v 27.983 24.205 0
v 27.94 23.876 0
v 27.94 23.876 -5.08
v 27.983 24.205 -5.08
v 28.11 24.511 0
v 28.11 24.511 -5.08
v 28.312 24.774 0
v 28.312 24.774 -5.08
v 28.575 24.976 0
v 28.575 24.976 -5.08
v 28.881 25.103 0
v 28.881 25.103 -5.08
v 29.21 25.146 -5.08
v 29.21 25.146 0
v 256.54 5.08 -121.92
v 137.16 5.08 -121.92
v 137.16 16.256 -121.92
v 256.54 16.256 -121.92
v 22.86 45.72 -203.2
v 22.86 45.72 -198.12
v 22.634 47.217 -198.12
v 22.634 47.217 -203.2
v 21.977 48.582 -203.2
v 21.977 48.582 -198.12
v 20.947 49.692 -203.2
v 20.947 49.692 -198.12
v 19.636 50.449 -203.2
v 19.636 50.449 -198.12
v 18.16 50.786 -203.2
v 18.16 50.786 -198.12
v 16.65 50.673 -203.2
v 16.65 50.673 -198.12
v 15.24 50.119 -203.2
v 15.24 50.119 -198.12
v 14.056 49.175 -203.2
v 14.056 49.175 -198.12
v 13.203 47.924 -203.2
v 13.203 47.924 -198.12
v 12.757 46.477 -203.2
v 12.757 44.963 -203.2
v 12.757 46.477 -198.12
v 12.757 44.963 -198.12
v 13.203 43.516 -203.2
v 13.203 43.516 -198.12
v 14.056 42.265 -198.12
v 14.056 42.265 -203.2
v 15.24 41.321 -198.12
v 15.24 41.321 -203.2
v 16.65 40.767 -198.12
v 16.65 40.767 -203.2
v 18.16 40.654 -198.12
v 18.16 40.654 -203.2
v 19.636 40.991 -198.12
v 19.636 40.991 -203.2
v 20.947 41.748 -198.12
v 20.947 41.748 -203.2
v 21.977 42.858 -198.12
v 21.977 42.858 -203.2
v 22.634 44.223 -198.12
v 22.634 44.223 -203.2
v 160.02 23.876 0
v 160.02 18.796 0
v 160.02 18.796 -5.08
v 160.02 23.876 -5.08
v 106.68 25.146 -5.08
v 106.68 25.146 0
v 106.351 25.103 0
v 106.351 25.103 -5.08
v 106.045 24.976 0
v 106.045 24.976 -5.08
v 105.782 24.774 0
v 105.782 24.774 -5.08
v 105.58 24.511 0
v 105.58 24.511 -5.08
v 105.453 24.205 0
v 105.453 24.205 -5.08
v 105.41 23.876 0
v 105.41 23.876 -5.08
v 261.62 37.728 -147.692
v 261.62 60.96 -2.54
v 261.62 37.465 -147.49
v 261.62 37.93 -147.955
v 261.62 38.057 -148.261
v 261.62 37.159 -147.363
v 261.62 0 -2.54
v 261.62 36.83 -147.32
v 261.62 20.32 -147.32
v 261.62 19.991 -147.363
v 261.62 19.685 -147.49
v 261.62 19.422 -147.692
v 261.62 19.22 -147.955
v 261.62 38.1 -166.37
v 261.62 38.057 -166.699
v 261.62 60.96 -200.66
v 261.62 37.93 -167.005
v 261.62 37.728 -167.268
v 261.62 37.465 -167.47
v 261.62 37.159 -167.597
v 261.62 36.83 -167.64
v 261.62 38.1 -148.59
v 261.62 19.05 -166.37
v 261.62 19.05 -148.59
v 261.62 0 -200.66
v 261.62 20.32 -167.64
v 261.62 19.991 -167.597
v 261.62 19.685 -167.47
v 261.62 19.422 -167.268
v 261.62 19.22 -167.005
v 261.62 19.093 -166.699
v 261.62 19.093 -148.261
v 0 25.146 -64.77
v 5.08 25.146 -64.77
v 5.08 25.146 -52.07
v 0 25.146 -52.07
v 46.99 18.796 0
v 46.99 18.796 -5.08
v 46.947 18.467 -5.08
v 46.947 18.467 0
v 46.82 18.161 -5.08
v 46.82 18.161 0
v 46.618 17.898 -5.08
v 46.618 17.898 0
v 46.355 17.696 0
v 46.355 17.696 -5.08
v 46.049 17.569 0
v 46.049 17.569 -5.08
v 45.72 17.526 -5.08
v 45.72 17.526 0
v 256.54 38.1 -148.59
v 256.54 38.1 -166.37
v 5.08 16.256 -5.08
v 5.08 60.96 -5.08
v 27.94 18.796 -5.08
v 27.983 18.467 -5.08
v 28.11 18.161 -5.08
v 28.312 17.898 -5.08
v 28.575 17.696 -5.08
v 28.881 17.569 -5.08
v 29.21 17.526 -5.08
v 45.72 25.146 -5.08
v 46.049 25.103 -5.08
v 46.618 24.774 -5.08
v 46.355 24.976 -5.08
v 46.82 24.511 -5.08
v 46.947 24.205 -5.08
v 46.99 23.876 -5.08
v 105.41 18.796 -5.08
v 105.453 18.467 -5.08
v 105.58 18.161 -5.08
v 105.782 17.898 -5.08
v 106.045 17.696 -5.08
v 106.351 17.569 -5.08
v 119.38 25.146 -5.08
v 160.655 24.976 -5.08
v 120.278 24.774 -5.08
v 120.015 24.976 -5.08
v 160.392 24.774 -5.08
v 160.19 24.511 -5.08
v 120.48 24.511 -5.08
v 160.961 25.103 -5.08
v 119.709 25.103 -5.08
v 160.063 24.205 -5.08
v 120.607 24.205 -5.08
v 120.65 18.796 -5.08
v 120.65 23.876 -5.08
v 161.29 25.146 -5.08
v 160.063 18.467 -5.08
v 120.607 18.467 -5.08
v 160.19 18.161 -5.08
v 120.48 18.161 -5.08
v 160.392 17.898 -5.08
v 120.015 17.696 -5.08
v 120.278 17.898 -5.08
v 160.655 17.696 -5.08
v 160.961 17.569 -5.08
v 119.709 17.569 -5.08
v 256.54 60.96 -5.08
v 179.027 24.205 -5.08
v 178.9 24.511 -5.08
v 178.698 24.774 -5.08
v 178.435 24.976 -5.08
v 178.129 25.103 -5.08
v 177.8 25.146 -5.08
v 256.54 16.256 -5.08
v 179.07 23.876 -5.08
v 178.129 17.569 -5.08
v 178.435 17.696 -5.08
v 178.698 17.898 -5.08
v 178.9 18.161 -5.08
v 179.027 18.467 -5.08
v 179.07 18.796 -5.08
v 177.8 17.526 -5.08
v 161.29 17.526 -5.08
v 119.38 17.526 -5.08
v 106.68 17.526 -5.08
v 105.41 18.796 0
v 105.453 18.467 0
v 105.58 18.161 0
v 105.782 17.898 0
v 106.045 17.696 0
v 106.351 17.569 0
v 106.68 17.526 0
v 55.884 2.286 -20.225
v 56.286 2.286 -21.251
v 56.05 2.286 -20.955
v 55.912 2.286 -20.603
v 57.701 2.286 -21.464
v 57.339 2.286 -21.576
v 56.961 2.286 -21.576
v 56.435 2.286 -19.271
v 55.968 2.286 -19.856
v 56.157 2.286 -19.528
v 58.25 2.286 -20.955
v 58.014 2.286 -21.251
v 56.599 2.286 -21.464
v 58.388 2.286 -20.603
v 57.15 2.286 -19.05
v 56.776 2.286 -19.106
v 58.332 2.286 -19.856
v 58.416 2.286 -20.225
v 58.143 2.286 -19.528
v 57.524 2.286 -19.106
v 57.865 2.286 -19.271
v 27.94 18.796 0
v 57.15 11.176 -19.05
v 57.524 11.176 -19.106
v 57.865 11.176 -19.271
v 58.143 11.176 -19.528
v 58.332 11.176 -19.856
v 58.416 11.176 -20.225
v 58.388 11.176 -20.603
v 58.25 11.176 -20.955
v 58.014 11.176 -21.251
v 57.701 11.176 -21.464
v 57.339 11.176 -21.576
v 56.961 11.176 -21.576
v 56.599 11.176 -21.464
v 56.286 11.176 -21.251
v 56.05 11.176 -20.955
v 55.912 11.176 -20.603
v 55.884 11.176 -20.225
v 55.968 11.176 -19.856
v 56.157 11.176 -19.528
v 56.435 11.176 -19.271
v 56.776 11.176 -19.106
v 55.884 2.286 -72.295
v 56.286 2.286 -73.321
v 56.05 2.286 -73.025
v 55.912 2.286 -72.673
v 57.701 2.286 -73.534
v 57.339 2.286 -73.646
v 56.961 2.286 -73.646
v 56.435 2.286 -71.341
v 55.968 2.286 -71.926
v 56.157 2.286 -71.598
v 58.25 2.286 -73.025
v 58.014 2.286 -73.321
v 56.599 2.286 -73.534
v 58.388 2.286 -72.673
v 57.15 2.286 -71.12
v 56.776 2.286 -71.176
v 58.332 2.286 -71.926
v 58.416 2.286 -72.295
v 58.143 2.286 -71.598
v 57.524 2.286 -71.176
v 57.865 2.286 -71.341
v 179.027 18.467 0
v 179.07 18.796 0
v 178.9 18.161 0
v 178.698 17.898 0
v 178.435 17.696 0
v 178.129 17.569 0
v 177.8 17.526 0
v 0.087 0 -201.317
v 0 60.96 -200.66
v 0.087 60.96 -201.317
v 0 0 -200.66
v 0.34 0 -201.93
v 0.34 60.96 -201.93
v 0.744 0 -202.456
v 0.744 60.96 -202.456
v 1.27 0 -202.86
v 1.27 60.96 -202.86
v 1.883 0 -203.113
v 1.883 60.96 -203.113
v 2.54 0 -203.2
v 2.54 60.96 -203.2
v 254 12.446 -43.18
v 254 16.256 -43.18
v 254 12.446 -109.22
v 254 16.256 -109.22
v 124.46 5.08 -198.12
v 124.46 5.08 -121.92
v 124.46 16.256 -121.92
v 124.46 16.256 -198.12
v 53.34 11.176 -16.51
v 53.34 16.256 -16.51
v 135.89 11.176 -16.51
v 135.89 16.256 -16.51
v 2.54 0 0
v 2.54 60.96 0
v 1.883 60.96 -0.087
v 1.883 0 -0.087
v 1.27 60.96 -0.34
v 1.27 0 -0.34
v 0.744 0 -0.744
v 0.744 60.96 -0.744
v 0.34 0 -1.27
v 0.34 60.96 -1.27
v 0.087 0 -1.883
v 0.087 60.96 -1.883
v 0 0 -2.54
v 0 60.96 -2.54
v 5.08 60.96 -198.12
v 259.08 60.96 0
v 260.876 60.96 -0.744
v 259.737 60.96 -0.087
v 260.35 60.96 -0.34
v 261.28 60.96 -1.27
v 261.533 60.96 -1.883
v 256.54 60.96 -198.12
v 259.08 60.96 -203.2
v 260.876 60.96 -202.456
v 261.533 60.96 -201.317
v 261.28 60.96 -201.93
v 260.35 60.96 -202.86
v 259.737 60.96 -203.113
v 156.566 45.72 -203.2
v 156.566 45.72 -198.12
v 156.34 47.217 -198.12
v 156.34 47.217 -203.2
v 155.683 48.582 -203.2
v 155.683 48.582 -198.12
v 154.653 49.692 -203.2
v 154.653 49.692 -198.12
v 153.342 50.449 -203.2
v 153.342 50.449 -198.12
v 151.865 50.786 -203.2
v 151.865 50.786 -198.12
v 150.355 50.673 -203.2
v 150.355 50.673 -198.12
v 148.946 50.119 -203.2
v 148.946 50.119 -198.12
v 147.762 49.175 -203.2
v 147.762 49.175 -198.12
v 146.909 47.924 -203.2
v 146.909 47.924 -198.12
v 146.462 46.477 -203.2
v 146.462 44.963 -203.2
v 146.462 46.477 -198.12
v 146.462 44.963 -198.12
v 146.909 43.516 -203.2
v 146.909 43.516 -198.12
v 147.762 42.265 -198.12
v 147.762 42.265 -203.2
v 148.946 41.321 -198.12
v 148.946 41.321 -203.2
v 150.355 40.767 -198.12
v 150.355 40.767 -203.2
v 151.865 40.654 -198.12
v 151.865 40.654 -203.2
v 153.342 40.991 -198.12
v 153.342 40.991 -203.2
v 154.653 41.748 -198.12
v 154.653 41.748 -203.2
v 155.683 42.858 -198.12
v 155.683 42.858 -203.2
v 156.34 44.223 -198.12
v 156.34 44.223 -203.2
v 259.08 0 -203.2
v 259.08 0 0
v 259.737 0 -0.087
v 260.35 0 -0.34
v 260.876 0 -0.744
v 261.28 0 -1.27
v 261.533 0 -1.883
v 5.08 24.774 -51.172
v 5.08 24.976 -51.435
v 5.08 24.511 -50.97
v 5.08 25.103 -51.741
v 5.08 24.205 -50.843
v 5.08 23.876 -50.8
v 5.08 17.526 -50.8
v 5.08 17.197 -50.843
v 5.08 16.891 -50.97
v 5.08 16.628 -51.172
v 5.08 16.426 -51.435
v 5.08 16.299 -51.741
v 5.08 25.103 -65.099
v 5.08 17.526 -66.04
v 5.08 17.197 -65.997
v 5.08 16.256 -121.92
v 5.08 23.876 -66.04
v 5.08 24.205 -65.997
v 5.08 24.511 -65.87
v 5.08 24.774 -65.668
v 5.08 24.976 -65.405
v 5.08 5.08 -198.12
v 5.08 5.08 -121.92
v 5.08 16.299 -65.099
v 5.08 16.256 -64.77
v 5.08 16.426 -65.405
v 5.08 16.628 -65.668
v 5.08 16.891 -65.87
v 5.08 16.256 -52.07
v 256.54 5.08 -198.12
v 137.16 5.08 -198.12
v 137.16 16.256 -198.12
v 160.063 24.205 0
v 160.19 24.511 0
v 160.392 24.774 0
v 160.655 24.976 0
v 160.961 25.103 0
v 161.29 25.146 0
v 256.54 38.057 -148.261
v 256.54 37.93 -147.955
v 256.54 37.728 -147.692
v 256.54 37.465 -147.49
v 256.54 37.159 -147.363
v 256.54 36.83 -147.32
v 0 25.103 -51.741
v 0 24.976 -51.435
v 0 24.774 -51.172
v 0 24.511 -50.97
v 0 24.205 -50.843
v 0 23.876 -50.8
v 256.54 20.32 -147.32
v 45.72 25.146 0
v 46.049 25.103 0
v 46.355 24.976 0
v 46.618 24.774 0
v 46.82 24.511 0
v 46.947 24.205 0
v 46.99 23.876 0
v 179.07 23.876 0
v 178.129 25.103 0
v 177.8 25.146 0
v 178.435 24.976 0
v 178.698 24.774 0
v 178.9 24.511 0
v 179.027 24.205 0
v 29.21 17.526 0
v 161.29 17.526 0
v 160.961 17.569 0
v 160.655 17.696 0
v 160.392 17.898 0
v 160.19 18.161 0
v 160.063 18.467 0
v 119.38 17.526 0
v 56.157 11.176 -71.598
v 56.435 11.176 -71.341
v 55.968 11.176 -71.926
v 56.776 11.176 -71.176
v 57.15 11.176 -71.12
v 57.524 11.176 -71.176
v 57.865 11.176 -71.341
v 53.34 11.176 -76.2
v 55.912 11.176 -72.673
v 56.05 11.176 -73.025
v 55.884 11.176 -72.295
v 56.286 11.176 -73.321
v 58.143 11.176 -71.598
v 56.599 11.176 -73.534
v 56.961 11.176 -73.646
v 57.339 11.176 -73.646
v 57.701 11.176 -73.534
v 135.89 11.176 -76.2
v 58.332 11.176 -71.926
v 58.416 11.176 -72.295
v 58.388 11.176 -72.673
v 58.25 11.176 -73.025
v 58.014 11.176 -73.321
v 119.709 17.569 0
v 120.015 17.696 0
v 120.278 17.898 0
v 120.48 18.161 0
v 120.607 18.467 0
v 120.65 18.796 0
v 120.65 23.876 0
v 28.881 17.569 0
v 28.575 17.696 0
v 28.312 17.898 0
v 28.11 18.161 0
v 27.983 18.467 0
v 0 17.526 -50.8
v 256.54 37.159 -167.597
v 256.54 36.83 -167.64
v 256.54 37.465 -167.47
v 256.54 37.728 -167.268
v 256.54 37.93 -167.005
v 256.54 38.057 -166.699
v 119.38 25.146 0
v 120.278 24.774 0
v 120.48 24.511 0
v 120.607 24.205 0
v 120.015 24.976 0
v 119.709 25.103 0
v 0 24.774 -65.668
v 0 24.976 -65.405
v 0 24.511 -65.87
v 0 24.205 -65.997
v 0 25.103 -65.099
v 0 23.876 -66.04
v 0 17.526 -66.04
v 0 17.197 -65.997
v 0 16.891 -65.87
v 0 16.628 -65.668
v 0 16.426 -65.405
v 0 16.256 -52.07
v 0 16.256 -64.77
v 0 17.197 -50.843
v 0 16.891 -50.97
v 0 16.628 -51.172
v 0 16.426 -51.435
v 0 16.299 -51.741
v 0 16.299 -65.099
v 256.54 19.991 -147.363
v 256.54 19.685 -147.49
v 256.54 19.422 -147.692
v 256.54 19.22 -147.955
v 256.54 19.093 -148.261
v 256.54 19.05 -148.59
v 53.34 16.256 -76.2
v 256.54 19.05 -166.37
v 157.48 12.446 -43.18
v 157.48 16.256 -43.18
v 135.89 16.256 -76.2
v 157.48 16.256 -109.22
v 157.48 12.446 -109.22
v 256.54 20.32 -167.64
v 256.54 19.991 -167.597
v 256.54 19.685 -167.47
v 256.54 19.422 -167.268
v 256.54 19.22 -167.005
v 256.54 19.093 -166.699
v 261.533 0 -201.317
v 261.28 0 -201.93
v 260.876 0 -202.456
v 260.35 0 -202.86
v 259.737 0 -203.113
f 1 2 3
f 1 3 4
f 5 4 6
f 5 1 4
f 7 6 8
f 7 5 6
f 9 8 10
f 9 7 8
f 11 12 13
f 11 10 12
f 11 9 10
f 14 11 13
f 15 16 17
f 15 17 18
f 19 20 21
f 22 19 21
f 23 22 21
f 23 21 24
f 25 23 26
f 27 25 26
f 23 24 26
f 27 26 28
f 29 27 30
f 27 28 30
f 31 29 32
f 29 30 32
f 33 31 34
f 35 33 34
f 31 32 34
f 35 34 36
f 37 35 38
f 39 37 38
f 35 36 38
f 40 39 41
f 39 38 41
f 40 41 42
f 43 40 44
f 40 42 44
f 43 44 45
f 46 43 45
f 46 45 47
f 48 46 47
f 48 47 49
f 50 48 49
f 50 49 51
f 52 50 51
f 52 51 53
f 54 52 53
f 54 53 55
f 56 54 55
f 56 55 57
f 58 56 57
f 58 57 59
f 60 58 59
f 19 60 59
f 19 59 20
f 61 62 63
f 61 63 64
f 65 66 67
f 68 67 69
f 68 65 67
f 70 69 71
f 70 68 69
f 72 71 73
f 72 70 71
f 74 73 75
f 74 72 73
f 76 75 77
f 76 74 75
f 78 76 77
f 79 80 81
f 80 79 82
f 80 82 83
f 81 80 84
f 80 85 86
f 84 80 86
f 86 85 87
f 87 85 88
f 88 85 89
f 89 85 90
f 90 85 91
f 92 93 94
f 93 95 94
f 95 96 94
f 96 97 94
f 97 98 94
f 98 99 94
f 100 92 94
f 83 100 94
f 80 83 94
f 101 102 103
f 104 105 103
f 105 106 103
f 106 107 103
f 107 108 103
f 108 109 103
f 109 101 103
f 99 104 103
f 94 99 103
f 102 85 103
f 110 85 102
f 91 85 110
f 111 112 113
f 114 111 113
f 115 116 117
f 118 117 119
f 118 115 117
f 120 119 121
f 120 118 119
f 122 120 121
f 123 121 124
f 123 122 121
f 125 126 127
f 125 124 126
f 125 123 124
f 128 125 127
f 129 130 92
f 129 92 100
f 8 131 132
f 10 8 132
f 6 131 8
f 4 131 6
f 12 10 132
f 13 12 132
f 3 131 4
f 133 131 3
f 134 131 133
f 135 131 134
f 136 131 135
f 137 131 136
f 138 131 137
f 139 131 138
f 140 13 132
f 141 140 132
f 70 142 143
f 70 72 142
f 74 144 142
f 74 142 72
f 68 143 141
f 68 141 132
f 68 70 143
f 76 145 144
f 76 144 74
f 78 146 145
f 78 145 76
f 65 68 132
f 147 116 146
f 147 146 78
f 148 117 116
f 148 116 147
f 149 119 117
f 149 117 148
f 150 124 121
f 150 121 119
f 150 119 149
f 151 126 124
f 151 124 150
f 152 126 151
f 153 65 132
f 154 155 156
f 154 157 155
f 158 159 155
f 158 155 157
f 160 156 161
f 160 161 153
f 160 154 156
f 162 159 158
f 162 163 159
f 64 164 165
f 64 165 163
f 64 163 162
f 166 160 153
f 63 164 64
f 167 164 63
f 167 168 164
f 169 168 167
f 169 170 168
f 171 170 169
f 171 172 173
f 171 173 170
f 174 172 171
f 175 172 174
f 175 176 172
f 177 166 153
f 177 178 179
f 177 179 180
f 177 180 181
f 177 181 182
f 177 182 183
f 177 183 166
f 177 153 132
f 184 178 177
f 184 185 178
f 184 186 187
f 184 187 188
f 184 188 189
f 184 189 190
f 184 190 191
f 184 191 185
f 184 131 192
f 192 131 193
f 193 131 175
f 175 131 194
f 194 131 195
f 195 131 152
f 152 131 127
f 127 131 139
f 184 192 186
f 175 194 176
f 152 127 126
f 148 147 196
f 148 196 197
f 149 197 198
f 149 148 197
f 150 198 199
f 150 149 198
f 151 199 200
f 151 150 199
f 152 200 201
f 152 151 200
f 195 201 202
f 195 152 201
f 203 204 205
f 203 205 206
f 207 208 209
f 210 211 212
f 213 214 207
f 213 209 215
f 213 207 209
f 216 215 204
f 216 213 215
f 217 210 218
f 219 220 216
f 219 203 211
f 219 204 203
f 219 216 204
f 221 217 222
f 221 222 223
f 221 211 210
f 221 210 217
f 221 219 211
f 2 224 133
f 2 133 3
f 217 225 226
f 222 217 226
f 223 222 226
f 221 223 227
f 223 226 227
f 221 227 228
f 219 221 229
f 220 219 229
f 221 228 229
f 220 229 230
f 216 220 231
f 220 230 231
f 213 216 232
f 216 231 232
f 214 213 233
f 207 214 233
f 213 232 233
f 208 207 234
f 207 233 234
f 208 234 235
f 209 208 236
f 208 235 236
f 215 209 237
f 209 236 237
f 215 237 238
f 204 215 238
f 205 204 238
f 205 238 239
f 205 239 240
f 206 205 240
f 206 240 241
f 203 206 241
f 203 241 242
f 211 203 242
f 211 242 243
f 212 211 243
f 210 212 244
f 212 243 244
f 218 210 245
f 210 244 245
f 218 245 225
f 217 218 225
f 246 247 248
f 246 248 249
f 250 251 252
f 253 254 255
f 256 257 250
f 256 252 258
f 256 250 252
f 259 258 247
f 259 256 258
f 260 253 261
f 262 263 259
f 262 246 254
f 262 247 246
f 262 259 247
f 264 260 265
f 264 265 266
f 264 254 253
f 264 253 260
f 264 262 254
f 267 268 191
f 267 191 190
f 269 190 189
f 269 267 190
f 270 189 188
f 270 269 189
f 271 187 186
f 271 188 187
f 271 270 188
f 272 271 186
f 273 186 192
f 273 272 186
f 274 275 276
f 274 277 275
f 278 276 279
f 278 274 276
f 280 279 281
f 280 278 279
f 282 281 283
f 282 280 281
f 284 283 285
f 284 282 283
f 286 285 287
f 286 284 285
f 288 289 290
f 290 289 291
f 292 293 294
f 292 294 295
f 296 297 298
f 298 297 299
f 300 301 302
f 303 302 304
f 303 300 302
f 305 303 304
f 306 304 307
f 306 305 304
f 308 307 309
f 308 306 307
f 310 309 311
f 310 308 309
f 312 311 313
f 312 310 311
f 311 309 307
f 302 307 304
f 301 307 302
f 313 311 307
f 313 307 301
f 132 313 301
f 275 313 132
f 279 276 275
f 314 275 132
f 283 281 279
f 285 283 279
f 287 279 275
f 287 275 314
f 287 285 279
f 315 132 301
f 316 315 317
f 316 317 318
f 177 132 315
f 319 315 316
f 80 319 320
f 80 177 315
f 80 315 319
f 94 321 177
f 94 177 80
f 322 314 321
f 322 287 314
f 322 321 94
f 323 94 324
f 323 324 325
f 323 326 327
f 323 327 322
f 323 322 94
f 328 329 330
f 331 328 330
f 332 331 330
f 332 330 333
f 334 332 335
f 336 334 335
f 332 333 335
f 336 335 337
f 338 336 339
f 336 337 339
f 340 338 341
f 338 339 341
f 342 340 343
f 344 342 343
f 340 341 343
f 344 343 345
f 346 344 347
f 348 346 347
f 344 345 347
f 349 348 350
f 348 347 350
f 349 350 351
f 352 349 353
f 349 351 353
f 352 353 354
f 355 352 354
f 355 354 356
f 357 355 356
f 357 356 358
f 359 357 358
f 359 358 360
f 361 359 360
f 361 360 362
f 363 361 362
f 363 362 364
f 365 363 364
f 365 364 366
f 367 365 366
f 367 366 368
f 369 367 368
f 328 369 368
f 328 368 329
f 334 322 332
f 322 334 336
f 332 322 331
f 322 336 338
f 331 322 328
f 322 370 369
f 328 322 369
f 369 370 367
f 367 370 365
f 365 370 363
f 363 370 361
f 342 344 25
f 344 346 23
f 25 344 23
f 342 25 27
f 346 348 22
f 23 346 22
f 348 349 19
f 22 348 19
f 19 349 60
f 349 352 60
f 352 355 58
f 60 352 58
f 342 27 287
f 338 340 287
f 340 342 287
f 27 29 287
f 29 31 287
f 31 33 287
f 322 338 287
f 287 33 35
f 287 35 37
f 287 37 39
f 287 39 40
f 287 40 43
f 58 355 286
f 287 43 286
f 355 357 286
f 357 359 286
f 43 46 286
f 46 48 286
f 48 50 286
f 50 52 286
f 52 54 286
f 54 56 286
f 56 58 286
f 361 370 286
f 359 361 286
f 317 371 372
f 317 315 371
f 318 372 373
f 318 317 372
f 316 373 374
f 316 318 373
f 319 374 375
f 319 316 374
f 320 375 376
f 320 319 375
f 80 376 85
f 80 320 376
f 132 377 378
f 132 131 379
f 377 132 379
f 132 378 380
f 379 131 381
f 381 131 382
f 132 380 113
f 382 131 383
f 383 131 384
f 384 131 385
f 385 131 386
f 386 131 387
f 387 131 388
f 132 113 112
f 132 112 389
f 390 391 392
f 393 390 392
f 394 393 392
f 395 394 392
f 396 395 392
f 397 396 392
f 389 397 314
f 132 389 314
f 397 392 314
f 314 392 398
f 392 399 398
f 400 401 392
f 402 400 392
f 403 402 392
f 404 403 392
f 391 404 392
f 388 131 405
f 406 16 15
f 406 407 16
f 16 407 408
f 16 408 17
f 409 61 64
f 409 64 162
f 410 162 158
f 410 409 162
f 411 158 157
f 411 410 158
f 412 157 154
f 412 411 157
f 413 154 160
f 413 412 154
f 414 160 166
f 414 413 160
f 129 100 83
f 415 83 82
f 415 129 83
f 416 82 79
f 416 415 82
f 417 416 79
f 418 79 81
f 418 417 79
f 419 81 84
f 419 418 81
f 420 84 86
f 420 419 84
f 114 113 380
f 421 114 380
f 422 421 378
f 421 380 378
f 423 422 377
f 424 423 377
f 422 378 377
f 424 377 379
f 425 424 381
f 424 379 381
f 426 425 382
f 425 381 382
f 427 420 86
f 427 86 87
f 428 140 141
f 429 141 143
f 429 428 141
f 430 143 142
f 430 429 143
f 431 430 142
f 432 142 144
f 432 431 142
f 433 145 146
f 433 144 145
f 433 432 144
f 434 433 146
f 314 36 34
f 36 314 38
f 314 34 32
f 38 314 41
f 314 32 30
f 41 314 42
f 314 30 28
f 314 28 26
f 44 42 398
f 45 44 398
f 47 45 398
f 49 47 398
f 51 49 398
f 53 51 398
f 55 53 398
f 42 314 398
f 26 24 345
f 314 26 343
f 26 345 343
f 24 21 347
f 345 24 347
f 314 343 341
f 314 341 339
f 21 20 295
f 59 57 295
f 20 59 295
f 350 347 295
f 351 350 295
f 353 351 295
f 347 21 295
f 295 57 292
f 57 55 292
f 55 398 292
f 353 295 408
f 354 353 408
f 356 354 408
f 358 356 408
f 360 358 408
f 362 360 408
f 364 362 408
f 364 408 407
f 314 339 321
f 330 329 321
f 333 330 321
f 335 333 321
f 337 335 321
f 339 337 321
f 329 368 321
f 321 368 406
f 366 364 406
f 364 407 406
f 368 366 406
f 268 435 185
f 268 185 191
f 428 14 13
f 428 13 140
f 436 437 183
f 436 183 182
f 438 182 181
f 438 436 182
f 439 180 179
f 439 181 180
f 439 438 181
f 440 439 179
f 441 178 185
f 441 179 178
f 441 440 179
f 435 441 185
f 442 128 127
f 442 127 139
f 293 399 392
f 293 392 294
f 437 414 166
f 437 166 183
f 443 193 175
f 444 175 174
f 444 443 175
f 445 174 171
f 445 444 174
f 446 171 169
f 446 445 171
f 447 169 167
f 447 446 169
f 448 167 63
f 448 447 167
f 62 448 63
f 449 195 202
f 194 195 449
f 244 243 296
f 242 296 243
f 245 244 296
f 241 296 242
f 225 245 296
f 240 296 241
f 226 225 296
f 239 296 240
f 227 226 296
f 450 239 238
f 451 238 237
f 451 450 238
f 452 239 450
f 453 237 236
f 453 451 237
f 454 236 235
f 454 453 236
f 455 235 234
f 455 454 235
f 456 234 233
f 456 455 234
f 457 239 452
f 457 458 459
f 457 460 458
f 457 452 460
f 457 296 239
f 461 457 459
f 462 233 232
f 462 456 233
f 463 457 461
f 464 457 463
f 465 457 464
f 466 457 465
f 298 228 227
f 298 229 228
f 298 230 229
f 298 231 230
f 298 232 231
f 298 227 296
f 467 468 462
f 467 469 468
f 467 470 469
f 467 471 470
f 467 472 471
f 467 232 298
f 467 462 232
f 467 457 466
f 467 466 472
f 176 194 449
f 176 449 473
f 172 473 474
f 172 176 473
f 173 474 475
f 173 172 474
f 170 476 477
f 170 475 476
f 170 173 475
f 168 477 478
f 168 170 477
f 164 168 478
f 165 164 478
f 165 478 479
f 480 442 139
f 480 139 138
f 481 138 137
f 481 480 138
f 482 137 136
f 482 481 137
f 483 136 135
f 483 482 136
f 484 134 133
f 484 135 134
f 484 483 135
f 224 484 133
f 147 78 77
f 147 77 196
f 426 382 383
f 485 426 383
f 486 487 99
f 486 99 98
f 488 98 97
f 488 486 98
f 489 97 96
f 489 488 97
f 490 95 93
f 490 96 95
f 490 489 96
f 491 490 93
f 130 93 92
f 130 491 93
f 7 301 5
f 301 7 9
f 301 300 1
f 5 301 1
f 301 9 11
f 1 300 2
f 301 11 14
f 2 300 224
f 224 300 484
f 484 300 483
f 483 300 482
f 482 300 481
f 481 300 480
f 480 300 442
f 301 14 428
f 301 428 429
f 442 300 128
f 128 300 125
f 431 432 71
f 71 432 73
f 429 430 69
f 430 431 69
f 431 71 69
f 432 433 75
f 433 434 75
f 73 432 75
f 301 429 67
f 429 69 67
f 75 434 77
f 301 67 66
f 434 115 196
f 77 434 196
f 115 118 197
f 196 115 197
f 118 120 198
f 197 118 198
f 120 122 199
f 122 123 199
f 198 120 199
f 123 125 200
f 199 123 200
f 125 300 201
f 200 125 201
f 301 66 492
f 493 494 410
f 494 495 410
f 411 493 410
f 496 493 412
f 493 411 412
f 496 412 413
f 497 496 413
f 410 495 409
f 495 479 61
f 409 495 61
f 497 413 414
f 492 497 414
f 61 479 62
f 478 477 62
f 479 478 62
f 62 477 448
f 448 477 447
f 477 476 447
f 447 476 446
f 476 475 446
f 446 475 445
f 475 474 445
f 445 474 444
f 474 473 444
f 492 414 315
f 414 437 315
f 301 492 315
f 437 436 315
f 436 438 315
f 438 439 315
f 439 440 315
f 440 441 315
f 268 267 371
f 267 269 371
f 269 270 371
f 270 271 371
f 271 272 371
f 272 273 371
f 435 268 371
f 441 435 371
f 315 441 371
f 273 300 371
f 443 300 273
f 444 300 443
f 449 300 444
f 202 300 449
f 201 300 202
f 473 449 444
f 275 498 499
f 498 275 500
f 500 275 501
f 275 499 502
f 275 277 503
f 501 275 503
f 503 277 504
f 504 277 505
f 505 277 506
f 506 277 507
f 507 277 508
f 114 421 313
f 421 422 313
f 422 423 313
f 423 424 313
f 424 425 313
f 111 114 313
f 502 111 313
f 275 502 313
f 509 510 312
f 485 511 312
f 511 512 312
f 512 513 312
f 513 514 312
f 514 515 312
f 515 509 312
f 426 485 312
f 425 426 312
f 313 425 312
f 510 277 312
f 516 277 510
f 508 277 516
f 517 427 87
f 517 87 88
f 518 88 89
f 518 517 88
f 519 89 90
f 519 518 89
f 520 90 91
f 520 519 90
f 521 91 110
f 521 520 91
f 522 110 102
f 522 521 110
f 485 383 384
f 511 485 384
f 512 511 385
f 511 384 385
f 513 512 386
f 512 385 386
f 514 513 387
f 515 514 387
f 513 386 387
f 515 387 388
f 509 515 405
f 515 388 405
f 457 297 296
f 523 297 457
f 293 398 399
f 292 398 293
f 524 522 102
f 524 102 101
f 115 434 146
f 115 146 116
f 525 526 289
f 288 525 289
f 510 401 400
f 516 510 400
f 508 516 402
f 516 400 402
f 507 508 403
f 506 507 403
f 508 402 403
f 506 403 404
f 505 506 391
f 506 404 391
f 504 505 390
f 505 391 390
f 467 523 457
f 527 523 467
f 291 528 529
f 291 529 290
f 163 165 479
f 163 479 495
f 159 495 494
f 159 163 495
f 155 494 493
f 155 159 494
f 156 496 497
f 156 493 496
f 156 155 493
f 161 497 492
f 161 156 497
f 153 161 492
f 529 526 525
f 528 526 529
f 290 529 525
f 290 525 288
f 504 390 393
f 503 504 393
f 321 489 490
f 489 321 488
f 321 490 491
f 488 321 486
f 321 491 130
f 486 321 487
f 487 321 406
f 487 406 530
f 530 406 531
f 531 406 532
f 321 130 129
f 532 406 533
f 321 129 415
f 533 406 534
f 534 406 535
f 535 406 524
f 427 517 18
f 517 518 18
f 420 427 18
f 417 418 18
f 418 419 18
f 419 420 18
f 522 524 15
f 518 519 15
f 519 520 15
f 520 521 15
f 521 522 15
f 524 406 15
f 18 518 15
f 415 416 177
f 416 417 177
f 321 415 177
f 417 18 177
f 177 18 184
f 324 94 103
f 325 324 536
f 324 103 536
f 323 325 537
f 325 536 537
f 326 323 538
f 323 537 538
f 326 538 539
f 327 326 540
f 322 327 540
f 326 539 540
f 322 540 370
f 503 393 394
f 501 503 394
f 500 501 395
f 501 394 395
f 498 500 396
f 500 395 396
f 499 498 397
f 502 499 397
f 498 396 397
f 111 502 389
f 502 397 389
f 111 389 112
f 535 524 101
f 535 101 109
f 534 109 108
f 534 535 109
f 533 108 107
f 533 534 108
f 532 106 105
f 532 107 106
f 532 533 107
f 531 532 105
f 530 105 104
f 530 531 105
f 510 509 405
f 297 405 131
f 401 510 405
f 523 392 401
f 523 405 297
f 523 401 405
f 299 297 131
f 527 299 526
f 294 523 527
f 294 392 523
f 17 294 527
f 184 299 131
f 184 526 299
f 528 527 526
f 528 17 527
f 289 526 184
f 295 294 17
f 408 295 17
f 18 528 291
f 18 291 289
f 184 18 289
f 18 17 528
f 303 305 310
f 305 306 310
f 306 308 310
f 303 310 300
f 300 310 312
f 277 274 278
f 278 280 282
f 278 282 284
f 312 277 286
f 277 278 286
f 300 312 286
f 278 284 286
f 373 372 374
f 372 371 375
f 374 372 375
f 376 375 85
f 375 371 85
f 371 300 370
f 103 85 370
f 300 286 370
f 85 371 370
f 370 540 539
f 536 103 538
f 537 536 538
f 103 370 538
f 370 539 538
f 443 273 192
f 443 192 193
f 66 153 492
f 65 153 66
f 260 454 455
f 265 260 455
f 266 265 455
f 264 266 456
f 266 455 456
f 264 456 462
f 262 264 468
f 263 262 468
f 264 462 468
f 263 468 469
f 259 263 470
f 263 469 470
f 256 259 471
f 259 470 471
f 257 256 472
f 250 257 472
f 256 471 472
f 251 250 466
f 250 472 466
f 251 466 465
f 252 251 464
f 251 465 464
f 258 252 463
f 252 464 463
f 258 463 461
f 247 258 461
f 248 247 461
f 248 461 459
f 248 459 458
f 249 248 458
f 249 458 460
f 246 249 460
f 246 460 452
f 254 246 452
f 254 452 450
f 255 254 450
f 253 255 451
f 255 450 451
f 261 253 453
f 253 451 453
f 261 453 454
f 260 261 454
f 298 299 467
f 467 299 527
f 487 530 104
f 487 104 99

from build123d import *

# Parameters (mm, degrees)
SKETCH1_W           = 261.62
SKETCH1_H           = 203.2
BOSS_EXTRUDE1_DEPTH = 5.08
BOSS_EXTRUDE3_DEPTH = 55.88
BOSS_EXTRUDE4_DEPTH = 11.176
SKETCH7_W           = 251.46
SKETCH7_H           = 116.84
BOSS_EXTRUDE5_DEPTH = 11.176
SKETCH8_R           = 5.08
CUT_EXTRUDE2_DEPTH  = 11.176
CUT_EXTRUDE3_DEPTH  = 11.176
SKETCH10_W          = 82.55
SKETCH10_H          = 59.69
CUT_EXTRUDE4_DEPTH  = 5.08
SKETCH12_R          = 1.27
CUT_EXTRUDE5_DEPTH  = 8.89
SKETCH13_W          = 96.52
SKETCH13_H          = 66.04
CUT_EXTRUDE6_DEPTH  = 3.81
SKETCH14_W          = 251.46
SKETCH14_H          = 5.08
BOSS_EXTRUDE6_DEPTH = 44.704
CUT_EXTRUDE7_DEPTH  = 39.624
CUT_EXTRUDE8_DEPTH  = 39.624
CUT_EXTRUDE9_DEPTH  = 39.624
FILLET1_R           = 2.54


with BuildPart() as part:
    # Sketch1 → Boss-Extrude1 (new body)
    with BuildSketch(Plane(origin=(0, 0, 0), x_dir=(1, 0, 0), z_dir=(0, 1, 0))):
        with Locations((130.81, 101.6)):
            Rectangle(SKETCH1_W, SKETCH1_H)
    extrude(amount=BOSS_EXTRUDE1_DEPTH)

    # Sketch4 → Boss-Extrude3 (add)
    with BuildSketch(Plane(origin=(0, 5.08, 0), x_dir=(1, 0, 0), z_dir=(0, 1, 0))):
        Polygon((0, 0), (5.08, 0), (5.08, 198.12), (256.54, 198.12), (256.54, 0), (261.62, 0), (261.62, 203.2), (0, 203.2), align=None)
    extrude(amount=BOSS_EXTRUDE3_DEPTH)

    # Sketch5 → Boss-Extrude4 (add)
    with BuildSketch(Plane(origin=(0, 5.08, 0), x_dir=(1, 0, 0), z_dir=(0, 1, 0))):
        Polygon((5.08, 121.92), (124.46, 121.92), (124.46, 198.12), (137.16, 198.12), (137.16, 121.92), (256.54, 121.92), (256.54, 116.84), (5.08, 116.84), align=None)
    extrude(amount=BOSS_EXTRUDE4_DEPTH)

    # Sketch7 → Boss-Extrude5 (add)
    with BuildSketch(Plane(origin=(0, 5.08, 0), x_dir=(1, 0, 0), z_dir=(0, 1, 0))):
        with Locations((130.81, 58.42)):
            Rectangle(SKETCH7_W, SKETCH7_H)
    extrude(amount=BOSS_EXTRUDE5_DEPTH)

    # Sketch8 → Cut-Extrude2 (cut)
    with BuildSketch(Plane.XY.offset(-198.12)):
        with Locations((17.78, 45.72)):
            Circle(SKETCH8_R)
        with Locations((151.4856, 45.72)):
            Circle(SKETCH8_R)
    extrude(amount=-CUT_EXTRUDE2_DEPTH, mode=Mode.SUBTRACT)

    # Sketch9 → Cut-Extrude3 (cut)
    with BuildSketch(Plane(origin=(5.08, 0, 0), x_dir=(0, 0, -1), z_dir=(1, 0, 0))):
        with BuildLine():
            Line((52.07, 16.256), (64.77, 16.256))
            ThreePointArc((64.77, 16.256), (65.668025612, 16.627974388), (66.04, 17.526))
            Line((66.04, 17.526), (66.04, 23.876))
            ThreePointArc((66.04, 23.876), (65.668025612, 24.774025612), (64.77, 25.146))
            Line((64.77, 25.146), (52.07, 25.146))
            ThreePointArc((52.07, 25.146), (51.171974388, 24.774025612), (50.8, 23.876))
            Line((50.8, 23.876), (50.8, 17.526))
            ThreePointArc((50.8, 17.526), (51.171974388, 16.627974388), (52.07, 16.256))
        make_face()
    extrude(amount=-CUT_EXTRUDE3_DEPTH, mode=Mode.SUBTRACT)

    # Sketch10 → Cut-Extrude4 (cut)
    with BuildSketch(Plane(origin=(0, 16.256, 0), x_dir=(1, 0, 0), z_dir=(0, 1, 0))):
        with Locations((94.615, 46.355)):
            Rectangle(SKETCH10_W, SKETCH10_H)
    extrude(amount=-CUT_EXTRUDE4_DEPTH, mode=Mode.SUBTRACT)

    # Sketch12 → Cut-Extrude5 (cut)
    with BuildSketch(Plane(origin=(0, 11.176, 0), x_dir=(1, 0, 0), z_dir=(0, 1, 0))):
        with Locations(Location((57.15, 72.39, 0), (0, 0, 270))):
            Circle(SKETCH12_R)
        with Locations(Location((57.15, 20.32, 0), (0, 0, 270))):
            Circle(SKETCH12_R)
    extrude(amount=-CUT_EXTRUDE5_DEPTH, mode=Mode.SUBTRACT)

    # Sketch13 → Cut-Extrude6 (cut)
    with BuildSketch(Plane(origin=(0, 16.256, 0), x_dir=(1, 0, 0), z_dir=(0, 1, 0))):
        with Locations((205.74, 76.2)):
            Rectangle(SKETCH13_W, SKETCH13_H)
    extrude(amount=-CUT_EXTRUDE6_DEPTH, mode=Mode.SUBTRACT)

    # Sketch14 → Boss-Extrude6 (add)
    with BuildSketch(Plane(origin=(0, 16.256, 0), x_dir=(1, 0, 0), z_dir=(0, 1, 0))):
        with Locations((130.81, 2.54)):
            Rectangle(SKETCH14_W, SKETCH14_H)
    extrude(amount=BOSS_EXTRUDE6_DEPTH)

    # Sketch15 → Cut-Extrude7 (cut)
    with BuildSketch(Plane(origin=(0, 0, -5.08), x_dir=(-1, 0, 0), z_dir=(0, 0, -1))):
        with BuildLine():
            Line((-106.68, 17.526), (-119.38, 17.526))
            ThreePointArc((-119.38, 17.526), (-120.278025612, 17.897974388), (-120.65, 18.796))
            Line((-120.65, 18.796), (-120.65, 23.876))
            ThreePointArc((-120.65, 23.876), (-120.278025612, 24.774025612), (-119.38, 25.146))
            Line((-119.38, 25.146), (-106.68, 25.146))
            ThreePointArc((-106.68, 25.146), (-105.781974388, 24.774025612), (-105.41, 23.876))
            Line((-105.41, 23.876), (-105.41, 18.796))
            ThreePointArc((-105.41, 18.796), (-105.781974388, 17.897974388), (-106.68, 17.526))
        make_face()
    extrude(amount=-CUT_EXTRUDE7_DEPTH, mode=Mode.SUBTRACT)

    # Sketch16 → Cut-Extrude8 (cut)
    with BuildSketch(Plane.XY):
        with BuildLine():
            Line((161.29, 25.146), (177.8, 25.146))
            ThreePointArc((177.8, 25.146), (178.698025612, 24.774025612), (179.07, 23.876))
            Line((179.07, 23.876), (179.07, 18.796))
            ThreePointArc((179.07, 18.796), (178.698025612, 17.897974388), (177.8, 17.526))
            Line((177.8, 17.526), (161.29, 17.526))
            ThreePointArc((161.29, 17.526), (160.391974388, 17.897974388), (160.02, 18.796))
            Line((160.02, 18.796), (160.02, 23.876))
            ThreePointArc((160.02, 23.876), (160.391974388, 24.774025612), (161.29, 25.146))
        make_face()
        with BuildLine():
            Line((29.21, 25.146), (45.72, 25.146))
            ThreePointArc((45.72, 25.146), (46.618025612, 24.774025612), (46.99, 23.876))
            Line((46.99, 23.876), (46.99, 18.796))
            ThreePointArc((46.99, 18.796), (46.618025612, 17.897974388), (45.72, 17.526))
            Line((45.72, 17.526), (29.21, 17.526))
            ThreePointArc((29.21, 17.526), (28.311974388, 17.897974388), (27.94, 18.796))
            Line((27.94, 18.796), (27.94, 23.876))
            ThreePointArc((27.94, 23.876), (28.311974388, 24.774025612), (29.21, 25.146))
        make_face()
    extrude(amount=-CUT_EXTRUDE8_DEPTH, mode=Mode.SUBTRACT)

    # Sketch17 → Cut-Extrude9 (cut)
    with BuildSketch(Plane.ZY.offset(-256.54)):
        with BuildLine():
            Line((-166.37, 38.1), (-148.59, 38.1))
            ThreePointArc((-148.59, 38.1), (-147.691974388, 37.728025612), (-147.32, 36.83))
            Line((-147.32, 36.83), (-147.32, 20.32))
            ThreePointArc((-147.32, 20.32), (-147.691974388, 19.421974388), (-148.59, 19.05))
            Line((-148.59, 19.05), (-166.37, 19.05))
            ThreePointArc((-166.37, 19.05), (-167.268025612, 19.421974388), (-167.64, 20.32))
            Line((-167.64, 20.32), (-167.64, 36.83))
            ThreePointArc((-167.64, 36.83), (-167.268025612, 37.728025612), (-166.37, 38.1))
        make_face()
    extrude(amount=-CUT_EXTRUDE9_DEPTH, mode=Mode.SUBTRACT)

    # Fillet1
    fillet1_edges = [part.edges().sort_by_distance(p)[0] for p in [
        (0, 30.48, -203.2),
        (261.62, 30.48, -203.2),
        (261.62, 30.48, 0),
        (0, 30.48, 0),
    ]]
    fillet(fillet1_edges, radius=FILLET1_R)


solid = part.part
